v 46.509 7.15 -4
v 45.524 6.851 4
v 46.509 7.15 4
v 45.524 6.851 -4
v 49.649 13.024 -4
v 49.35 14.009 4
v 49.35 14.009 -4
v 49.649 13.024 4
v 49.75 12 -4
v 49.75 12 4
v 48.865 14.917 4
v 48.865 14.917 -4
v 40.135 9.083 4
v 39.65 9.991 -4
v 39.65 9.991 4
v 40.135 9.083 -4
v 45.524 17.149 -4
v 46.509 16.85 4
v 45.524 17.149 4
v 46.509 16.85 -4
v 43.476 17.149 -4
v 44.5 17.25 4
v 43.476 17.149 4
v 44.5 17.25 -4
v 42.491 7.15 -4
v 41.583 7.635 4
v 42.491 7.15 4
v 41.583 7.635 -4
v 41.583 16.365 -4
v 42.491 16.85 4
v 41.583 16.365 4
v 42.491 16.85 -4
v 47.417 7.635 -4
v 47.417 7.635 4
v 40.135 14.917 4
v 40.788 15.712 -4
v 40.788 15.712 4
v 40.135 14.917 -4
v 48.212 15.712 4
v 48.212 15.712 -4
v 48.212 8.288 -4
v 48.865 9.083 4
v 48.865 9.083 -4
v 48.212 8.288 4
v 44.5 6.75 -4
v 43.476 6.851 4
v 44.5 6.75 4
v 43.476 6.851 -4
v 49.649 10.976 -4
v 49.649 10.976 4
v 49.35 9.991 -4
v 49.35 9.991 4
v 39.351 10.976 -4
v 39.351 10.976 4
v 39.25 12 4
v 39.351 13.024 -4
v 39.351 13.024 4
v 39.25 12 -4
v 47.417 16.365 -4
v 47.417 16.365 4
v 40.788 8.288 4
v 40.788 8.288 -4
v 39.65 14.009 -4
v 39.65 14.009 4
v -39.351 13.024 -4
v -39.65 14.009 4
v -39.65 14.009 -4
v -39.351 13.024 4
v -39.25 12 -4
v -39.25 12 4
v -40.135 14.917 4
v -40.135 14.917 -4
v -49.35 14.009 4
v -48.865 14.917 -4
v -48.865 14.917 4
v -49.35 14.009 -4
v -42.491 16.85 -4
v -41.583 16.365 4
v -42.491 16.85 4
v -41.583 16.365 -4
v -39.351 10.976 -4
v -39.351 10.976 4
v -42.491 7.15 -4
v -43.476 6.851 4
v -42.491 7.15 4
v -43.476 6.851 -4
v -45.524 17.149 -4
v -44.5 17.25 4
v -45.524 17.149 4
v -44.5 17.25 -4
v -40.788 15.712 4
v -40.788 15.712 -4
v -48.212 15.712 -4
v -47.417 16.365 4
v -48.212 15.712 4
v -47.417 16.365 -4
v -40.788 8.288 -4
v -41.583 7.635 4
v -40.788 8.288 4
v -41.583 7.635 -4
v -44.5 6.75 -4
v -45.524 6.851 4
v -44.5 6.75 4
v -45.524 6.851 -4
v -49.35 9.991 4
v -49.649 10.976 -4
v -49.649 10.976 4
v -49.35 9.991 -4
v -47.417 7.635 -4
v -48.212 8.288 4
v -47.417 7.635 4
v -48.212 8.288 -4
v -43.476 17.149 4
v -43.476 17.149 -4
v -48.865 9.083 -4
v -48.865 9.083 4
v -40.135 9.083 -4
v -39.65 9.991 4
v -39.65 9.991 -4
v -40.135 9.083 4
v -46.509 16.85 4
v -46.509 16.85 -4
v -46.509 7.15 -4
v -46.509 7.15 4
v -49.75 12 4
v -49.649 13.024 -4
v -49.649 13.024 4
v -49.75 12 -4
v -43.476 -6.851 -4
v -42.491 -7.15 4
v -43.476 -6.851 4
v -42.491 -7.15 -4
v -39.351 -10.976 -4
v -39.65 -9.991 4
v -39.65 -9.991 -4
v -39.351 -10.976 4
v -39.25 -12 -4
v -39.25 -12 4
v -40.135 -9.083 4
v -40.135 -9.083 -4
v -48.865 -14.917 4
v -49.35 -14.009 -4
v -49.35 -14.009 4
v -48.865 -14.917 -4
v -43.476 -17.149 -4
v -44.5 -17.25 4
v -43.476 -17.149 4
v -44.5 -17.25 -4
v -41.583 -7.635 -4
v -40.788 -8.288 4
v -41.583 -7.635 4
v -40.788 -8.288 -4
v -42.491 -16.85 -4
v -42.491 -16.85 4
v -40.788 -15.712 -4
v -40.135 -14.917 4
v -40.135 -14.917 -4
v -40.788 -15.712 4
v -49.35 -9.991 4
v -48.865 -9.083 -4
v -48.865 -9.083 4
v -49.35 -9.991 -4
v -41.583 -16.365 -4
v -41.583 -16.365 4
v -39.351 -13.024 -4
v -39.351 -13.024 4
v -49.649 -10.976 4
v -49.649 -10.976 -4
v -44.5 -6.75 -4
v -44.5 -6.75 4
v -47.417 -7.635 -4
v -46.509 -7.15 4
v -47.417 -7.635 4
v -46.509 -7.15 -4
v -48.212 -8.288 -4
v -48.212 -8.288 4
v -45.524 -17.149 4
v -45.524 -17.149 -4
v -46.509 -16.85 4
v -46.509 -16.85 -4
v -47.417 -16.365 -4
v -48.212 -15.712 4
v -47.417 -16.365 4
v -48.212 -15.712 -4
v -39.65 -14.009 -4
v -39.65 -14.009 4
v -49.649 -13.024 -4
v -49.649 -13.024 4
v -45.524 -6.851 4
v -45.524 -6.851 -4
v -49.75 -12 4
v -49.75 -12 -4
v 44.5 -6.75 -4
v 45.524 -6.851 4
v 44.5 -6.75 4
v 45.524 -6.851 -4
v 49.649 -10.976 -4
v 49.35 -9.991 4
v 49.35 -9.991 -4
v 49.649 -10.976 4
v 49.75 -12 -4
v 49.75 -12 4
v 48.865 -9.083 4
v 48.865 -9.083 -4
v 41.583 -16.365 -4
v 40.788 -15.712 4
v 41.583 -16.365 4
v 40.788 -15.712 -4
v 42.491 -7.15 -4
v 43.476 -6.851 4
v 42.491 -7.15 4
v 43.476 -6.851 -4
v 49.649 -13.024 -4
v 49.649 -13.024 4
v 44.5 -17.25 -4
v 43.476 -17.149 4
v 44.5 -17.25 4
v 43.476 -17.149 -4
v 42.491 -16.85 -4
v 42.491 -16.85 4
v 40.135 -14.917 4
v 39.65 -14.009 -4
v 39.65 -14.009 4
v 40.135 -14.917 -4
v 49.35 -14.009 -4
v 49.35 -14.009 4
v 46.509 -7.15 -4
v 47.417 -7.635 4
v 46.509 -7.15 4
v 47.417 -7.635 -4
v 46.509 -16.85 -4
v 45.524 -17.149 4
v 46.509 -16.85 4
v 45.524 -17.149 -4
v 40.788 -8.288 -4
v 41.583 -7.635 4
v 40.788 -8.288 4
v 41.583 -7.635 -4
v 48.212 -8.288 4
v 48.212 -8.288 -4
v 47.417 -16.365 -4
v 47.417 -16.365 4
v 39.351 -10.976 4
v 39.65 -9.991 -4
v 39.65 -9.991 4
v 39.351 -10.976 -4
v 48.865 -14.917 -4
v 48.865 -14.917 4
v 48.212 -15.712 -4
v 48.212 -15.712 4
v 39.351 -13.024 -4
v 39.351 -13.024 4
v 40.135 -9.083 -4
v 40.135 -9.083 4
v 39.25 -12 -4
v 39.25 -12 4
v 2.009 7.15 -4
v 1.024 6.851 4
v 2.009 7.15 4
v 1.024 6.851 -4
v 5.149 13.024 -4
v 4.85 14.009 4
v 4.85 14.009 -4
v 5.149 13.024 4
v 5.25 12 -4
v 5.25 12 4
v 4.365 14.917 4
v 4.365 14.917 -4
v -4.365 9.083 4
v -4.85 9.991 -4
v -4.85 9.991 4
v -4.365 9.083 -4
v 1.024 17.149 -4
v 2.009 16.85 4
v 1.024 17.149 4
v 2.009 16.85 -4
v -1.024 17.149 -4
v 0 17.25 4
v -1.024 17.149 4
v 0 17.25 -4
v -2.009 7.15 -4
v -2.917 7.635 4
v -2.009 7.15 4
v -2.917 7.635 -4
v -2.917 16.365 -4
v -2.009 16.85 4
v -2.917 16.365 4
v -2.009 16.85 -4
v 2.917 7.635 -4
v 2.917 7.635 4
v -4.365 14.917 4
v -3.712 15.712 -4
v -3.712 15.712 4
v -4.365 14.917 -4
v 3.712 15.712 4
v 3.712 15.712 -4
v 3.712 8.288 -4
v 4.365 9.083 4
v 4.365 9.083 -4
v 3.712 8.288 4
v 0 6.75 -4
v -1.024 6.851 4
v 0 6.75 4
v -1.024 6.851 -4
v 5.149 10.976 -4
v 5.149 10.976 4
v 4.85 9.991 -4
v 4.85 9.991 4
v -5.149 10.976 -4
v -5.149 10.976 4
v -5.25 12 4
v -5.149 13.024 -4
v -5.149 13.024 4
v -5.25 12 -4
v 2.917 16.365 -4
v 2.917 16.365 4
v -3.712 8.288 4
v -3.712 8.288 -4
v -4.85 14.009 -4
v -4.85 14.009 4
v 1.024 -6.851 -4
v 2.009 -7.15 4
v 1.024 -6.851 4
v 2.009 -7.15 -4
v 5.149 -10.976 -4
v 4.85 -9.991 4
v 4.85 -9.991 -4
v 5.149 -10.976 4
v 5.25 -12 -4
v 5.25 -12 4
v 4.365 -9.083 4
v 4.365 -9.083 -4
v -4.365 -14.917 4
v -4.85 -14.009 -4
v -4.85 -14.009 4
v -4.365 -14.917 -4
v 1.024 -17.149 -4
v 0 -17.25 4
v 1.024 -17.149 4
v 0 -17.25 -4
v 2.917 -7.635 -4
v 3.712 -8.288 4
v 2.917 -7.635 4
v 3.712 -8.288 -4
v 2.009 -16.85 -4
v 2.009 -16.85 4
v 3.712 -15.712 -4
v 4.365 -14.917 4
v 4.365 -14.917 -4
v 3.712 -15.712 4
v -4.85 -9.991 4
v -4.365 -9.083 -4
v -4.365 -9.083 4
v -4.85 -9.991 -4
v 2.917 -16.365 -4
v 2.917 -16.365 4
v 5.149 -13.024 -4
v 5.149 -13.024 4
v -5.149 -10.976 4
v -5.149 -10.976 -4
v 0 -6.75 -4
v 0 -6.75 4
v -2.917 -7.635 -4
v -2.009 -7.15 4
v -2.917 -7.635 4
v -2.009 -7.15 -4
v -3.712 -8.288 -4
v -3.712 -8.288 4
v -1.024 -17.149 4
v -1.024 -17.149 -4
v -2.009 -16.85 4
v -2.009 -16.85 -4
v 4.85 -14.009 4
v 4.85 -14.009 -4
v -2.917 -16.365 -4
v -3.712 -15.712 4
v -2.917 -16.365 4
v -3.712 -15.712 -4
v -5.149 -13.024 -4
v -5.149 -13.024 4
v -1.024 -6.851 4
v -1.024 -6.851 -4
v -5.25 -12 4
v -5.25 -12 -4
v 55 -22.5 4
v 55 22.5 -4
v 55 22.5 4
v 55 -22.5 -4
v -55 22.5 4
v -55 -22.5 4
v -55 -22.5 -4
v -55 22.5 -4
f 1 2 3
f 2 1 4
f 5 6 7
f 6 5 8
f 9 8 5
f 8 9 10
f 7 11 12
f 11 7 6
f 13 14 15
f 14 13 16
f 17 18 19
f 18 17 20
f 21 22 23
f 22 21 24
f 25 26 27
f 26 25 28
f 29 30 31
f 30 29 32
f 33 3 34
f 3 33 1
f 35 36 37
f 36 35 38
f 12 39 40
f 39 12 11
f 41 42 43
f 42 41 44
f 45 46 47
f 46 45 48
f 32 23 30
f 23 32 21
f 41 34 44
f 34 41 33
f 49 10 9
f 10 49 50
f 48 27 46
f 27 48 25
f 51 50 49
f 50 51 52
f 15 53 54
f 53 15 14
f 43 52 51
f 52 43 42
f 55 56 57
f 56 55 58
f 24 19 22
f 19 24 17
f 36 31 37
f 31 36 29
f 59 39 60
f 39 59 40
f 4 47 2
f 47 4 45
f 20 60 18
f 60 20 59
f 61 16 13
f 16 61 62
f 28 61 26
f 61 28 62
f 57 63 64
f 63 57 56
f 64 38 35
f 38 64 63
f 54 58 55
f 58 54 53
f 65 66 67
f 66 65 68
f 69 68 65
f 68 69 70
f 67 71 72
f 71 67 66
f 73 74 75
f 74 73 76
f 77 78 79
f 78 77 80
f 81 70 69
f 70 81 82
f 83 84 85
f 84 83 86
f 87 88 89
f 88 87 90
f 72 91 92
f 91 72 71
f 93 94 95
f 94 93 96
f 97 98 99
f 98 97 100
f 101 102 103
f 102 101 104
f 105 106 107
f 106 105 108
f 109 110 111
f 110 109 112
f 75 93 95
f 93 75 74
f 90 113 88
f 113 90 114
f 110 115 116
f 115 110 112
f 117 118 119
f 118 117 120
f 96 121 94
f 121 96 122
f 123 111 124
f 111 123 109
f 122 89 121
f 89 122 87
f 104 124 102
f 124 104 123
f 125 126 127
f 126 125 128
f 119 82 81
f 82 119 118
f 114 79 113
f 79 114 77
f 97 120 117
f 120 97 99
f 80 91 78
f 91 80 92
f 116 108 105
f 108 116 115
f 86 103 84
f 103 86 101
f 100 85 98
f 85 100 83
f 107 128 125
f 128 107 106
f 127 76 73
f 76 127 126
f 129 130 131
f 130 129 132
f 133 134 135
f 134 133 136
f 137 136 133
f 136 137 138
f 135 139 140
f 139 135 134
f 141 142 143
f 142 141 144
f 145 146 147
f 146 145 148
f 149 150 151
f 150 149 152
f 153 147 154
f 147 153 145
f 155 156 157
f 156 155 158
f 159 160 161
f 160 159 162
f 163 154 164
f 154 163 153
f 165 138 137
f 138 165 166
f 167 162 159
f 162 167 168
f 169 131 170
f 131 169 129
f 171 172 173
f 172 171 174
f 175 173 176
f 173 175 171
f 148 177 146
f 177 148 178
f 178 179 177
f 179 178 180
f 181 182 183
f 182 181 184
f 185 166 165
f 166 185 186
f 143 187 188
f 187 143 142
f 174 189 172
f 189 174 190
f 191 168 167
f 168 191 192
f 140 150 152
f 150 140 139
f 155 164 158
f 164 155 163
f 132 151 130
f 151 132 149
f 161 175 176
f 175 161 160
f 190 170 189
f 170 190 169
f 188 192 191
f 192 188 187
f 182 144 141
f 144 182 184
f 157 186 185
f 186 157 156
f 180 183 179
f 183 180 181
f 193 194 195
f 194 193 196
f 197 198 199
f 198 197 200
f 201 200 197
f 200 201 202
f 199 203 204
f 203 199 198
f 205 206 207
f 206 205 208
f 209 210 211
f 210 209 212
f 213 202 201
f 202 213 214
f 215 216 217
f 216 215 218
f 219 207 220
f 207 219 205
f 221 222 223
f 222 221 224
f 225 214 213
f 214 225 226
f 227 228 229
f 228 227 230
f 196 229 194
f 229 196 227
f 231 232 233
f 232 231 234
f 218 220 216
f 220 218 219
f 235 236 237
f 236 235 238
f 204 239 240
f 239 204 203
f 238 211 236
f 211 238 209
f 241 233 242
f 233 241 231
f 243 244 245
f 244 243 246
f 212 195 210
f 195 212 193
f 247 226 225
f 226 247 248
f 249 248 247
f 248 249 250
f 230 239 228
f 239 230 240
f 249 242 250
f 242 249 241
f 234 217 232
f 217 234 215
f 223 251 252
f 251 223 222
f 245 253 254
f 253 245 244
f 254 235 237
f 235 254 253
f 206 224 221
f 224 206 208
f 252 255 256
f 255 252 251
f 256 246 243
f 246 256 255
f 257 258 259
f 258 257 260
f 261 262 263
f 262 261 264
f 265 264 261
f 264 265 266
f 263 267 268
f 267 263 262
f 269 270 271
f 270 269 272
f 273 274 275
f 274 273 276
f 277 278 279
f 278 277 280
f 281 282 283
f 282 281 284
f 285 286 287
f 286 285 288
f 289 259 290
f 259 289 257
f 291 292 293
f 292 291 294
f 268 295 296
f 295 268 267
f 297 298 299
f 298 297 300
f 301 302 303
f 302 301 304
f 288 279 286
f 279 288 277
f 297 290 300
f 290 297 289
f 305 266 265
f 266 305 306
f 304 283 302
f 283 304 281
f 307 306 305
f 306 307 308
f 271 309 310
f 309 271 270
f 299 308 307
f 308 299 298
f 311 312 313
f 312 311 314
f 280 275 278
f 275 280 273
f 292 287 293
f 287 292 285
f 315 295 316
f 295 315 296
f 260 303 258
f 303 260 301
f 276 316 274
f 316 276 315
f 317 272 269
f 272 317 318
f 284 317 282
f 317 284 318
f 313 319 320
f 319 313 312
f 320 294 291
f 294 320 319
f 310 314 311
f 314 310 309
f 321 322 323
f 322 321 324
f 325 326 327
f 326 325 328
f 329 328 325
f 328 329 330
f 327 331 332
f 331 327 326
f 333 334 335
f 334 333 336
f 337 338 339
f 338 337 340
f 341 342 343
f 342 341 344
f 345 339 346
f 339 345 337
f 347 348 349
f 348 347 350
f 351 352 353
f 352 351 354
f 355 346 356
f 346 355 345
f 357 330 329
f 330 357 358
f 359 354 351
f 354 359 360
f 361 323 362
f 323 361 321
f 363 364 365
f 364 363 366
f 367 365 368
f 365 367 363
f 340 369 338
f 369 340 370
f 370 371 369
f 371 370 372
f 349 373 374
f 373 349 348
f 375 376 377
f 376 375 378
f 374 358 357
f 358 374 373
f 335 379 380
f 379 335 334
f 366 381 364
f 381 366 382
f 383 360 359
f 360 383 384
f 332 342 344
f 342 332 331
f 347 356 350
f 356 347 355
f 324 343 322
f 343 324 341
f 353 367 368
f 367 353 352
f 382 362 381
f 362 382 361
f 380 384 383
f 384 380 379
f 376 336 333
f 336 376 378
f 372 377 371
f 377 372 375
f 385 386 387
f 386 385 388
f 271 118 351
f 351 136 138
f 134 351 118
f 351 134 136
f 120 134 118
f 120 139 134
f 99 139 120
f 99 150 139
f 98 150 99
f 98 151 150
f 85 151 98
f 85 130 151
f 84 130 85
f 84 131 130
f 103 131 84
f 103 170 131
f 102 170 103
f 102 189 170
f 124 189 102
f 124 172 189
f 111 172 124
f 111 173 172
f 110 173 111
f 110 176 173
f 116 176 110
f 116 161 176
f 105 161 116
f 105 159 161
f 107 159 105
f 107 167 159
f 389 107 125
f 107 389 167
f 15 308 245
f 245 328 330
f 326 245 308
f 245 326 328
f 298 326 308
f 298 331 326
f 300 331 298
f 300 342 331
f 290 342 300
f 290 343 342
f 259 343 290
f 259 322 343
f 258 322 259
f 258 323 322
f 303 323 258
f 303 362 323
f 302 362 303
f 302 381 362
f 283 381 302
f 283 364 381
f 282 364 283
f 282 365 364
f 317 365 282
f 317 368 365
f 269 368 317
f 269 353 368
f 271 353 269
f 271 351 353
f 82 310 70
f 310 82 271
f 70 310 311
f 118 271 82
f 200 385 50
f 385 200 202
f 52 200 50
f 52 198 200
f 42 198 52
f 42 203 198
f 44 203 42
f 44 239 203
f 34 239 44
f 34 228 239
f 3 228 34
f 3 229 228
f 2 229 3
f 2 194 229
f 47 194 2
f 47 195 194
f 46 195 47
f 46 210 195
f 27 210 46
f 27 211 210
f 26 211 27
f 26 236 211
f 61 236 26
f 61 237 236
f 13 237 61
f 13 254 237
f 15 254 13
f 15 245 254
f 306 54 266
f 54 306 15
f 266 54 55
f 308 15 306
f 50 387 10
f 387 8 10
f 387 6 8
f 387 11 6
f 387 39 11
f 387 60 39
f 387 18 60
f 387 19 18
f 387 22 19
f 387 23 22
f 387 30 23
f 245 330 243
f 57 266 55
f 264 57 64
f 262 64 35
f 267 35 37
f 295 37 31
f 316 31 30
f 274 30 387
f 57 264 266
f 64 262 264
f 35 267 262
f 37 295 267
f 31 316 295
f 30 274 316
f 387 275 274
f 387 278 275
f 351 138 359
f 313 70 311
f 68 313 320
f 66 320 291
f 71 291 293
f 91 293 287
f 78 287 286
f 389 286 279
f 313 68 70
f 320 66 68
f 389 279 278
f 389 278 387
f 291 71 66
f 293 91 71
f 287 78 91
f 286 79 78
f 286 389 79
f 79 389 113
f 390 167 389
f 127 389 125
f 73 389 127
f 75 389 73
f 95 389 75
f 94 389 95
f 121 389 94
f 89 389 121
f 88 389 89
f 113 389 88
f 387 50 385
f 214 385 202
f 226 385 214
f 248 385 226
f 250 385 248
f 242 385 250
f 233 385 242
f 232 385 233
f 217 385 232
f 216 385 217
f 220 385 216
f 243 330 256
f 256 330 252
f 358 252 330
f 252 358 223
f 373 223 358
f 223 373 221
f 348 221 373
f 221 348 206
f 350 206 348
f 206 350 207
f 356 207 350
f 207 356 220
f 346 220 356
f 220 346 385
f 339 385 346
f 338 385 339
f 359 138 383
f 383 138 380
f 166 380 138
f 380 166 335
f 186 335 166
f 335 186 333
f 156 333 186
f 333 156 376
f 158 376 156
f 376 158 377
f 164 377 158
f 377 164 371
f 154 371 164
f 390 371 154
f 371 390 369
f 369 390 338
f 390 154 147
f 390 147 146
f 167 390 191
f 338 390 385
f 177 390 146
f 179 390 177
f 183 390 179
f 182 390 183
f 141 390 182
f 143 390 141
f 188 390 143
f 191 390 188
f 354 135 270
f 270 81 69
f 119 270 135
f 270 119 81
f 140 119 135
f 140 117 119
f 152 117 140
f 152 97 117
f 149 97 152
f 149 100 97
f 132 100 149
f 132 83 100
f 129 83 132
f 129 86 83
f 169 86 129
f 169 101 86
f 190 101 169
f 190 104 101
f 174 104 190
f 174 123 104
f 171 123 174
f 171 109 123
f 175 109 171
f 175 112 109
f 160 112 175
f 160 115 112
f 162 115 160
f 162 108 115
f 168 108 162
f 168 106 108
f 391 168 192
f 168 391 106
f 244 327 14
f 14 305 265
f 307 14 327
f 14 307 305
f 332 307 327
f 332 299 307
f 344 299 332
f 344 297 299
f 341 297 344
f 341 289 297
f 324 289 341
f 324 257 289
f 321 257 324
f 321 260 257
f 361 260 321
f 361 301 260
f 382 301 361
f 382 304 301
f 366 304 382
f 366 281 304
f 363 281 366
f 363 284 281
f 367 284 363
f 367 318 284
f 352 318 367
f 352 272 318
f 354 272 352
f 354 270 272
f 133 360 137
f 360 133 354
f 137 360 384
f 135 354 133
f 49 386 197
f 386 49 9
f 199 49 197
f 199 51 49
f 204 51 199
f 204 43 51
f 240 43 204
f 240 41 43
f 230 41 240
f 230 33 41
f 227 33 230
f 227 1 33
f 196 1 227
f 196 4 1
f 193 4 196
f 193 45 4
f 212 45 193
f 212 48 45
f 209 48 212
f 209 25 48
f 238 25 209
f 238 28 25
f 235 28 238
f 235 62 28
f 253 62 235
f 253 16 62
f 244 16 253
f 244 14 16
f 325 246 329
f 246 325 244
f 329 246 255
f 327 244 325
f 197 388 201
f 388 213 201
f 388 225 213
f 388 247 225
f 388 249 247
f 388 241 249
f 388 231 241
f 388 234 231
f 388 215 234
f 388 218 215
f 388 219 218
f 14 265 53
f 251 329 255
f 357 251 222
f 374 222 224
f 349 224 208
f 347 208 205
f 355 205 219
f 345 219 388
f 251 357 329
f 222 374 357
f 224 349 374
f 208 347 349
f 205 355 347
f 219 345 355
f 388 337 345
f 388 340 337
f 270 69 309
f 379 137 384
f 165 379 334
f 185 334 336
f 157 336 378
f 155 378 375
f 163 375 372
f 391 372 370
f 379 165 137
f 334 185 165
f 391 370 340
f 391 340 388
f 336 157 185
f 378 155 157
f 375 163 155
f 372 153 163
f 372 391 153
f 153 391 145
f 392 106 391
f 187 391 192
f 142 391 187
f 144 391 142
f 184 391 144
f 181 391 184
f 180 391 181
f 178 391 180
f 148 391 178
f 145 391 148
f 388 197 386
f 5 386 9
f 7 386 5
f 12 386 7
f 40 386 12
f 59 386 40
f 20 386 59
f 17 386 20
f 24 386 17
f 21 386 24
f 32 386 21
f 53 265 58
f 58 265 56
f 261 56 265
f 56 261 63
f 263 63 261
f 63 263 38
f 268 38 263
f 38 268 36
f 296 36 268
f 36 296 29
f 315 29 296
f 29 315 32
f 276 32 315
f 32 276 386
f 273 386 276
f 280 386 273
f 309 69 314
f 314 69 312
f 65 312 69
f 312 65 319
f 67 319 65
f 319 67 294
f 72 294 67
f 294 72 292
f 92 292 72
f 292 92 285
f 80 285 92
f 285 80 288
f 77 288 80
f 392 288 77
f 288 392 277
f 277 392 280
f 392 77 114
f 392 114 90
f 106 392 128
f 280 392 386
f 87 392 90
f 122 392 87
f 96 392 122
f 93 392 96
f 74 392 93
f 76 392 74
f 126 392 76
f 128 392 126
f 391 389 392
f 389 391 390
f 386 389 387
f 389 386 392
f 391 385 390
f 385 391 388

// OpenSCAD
$fn = 32;

// ----------------------------------------------------------------------
// Corner plate 110 x 45 x 8
// 6 holes, centres taken from the edge offset
// ----------------------------------------------------------------------

// --- parameters (mm) ---
plate = [110, 45, 8];  // overall size (x, y, z)
holes = 6;             // number of holes the drawing asks for
hole_d = 10.5;         // hole diameter
edge = 10.5;           // hole centre offset from the plate edge

// --- derived feature positions (mm) ---
corner_x = plate[0] / 2 - edge;  // = 44.5   corner hole X
corner_y = plate[1] / 2 - edge;  // = 12   corner hole Y
feature_centers = [
  [corner_x, corner_y],
  [-corner_x, corner_y],
  [-corner_x, -corner_y],
  [corner_x, -corner_y],
  [0, corner_y],
  [0, -corner_y]
];   // hole centres the loop below drills

// plate outline, every hole drilled through with the same cutters
difference() {
  cube(plate, center = true);
  for (centre = feature_centers)
    translate([centre[0], centre[1], 0])
      cylinder(d = hole_d, h = plate[2] + 2, center = true);
}
